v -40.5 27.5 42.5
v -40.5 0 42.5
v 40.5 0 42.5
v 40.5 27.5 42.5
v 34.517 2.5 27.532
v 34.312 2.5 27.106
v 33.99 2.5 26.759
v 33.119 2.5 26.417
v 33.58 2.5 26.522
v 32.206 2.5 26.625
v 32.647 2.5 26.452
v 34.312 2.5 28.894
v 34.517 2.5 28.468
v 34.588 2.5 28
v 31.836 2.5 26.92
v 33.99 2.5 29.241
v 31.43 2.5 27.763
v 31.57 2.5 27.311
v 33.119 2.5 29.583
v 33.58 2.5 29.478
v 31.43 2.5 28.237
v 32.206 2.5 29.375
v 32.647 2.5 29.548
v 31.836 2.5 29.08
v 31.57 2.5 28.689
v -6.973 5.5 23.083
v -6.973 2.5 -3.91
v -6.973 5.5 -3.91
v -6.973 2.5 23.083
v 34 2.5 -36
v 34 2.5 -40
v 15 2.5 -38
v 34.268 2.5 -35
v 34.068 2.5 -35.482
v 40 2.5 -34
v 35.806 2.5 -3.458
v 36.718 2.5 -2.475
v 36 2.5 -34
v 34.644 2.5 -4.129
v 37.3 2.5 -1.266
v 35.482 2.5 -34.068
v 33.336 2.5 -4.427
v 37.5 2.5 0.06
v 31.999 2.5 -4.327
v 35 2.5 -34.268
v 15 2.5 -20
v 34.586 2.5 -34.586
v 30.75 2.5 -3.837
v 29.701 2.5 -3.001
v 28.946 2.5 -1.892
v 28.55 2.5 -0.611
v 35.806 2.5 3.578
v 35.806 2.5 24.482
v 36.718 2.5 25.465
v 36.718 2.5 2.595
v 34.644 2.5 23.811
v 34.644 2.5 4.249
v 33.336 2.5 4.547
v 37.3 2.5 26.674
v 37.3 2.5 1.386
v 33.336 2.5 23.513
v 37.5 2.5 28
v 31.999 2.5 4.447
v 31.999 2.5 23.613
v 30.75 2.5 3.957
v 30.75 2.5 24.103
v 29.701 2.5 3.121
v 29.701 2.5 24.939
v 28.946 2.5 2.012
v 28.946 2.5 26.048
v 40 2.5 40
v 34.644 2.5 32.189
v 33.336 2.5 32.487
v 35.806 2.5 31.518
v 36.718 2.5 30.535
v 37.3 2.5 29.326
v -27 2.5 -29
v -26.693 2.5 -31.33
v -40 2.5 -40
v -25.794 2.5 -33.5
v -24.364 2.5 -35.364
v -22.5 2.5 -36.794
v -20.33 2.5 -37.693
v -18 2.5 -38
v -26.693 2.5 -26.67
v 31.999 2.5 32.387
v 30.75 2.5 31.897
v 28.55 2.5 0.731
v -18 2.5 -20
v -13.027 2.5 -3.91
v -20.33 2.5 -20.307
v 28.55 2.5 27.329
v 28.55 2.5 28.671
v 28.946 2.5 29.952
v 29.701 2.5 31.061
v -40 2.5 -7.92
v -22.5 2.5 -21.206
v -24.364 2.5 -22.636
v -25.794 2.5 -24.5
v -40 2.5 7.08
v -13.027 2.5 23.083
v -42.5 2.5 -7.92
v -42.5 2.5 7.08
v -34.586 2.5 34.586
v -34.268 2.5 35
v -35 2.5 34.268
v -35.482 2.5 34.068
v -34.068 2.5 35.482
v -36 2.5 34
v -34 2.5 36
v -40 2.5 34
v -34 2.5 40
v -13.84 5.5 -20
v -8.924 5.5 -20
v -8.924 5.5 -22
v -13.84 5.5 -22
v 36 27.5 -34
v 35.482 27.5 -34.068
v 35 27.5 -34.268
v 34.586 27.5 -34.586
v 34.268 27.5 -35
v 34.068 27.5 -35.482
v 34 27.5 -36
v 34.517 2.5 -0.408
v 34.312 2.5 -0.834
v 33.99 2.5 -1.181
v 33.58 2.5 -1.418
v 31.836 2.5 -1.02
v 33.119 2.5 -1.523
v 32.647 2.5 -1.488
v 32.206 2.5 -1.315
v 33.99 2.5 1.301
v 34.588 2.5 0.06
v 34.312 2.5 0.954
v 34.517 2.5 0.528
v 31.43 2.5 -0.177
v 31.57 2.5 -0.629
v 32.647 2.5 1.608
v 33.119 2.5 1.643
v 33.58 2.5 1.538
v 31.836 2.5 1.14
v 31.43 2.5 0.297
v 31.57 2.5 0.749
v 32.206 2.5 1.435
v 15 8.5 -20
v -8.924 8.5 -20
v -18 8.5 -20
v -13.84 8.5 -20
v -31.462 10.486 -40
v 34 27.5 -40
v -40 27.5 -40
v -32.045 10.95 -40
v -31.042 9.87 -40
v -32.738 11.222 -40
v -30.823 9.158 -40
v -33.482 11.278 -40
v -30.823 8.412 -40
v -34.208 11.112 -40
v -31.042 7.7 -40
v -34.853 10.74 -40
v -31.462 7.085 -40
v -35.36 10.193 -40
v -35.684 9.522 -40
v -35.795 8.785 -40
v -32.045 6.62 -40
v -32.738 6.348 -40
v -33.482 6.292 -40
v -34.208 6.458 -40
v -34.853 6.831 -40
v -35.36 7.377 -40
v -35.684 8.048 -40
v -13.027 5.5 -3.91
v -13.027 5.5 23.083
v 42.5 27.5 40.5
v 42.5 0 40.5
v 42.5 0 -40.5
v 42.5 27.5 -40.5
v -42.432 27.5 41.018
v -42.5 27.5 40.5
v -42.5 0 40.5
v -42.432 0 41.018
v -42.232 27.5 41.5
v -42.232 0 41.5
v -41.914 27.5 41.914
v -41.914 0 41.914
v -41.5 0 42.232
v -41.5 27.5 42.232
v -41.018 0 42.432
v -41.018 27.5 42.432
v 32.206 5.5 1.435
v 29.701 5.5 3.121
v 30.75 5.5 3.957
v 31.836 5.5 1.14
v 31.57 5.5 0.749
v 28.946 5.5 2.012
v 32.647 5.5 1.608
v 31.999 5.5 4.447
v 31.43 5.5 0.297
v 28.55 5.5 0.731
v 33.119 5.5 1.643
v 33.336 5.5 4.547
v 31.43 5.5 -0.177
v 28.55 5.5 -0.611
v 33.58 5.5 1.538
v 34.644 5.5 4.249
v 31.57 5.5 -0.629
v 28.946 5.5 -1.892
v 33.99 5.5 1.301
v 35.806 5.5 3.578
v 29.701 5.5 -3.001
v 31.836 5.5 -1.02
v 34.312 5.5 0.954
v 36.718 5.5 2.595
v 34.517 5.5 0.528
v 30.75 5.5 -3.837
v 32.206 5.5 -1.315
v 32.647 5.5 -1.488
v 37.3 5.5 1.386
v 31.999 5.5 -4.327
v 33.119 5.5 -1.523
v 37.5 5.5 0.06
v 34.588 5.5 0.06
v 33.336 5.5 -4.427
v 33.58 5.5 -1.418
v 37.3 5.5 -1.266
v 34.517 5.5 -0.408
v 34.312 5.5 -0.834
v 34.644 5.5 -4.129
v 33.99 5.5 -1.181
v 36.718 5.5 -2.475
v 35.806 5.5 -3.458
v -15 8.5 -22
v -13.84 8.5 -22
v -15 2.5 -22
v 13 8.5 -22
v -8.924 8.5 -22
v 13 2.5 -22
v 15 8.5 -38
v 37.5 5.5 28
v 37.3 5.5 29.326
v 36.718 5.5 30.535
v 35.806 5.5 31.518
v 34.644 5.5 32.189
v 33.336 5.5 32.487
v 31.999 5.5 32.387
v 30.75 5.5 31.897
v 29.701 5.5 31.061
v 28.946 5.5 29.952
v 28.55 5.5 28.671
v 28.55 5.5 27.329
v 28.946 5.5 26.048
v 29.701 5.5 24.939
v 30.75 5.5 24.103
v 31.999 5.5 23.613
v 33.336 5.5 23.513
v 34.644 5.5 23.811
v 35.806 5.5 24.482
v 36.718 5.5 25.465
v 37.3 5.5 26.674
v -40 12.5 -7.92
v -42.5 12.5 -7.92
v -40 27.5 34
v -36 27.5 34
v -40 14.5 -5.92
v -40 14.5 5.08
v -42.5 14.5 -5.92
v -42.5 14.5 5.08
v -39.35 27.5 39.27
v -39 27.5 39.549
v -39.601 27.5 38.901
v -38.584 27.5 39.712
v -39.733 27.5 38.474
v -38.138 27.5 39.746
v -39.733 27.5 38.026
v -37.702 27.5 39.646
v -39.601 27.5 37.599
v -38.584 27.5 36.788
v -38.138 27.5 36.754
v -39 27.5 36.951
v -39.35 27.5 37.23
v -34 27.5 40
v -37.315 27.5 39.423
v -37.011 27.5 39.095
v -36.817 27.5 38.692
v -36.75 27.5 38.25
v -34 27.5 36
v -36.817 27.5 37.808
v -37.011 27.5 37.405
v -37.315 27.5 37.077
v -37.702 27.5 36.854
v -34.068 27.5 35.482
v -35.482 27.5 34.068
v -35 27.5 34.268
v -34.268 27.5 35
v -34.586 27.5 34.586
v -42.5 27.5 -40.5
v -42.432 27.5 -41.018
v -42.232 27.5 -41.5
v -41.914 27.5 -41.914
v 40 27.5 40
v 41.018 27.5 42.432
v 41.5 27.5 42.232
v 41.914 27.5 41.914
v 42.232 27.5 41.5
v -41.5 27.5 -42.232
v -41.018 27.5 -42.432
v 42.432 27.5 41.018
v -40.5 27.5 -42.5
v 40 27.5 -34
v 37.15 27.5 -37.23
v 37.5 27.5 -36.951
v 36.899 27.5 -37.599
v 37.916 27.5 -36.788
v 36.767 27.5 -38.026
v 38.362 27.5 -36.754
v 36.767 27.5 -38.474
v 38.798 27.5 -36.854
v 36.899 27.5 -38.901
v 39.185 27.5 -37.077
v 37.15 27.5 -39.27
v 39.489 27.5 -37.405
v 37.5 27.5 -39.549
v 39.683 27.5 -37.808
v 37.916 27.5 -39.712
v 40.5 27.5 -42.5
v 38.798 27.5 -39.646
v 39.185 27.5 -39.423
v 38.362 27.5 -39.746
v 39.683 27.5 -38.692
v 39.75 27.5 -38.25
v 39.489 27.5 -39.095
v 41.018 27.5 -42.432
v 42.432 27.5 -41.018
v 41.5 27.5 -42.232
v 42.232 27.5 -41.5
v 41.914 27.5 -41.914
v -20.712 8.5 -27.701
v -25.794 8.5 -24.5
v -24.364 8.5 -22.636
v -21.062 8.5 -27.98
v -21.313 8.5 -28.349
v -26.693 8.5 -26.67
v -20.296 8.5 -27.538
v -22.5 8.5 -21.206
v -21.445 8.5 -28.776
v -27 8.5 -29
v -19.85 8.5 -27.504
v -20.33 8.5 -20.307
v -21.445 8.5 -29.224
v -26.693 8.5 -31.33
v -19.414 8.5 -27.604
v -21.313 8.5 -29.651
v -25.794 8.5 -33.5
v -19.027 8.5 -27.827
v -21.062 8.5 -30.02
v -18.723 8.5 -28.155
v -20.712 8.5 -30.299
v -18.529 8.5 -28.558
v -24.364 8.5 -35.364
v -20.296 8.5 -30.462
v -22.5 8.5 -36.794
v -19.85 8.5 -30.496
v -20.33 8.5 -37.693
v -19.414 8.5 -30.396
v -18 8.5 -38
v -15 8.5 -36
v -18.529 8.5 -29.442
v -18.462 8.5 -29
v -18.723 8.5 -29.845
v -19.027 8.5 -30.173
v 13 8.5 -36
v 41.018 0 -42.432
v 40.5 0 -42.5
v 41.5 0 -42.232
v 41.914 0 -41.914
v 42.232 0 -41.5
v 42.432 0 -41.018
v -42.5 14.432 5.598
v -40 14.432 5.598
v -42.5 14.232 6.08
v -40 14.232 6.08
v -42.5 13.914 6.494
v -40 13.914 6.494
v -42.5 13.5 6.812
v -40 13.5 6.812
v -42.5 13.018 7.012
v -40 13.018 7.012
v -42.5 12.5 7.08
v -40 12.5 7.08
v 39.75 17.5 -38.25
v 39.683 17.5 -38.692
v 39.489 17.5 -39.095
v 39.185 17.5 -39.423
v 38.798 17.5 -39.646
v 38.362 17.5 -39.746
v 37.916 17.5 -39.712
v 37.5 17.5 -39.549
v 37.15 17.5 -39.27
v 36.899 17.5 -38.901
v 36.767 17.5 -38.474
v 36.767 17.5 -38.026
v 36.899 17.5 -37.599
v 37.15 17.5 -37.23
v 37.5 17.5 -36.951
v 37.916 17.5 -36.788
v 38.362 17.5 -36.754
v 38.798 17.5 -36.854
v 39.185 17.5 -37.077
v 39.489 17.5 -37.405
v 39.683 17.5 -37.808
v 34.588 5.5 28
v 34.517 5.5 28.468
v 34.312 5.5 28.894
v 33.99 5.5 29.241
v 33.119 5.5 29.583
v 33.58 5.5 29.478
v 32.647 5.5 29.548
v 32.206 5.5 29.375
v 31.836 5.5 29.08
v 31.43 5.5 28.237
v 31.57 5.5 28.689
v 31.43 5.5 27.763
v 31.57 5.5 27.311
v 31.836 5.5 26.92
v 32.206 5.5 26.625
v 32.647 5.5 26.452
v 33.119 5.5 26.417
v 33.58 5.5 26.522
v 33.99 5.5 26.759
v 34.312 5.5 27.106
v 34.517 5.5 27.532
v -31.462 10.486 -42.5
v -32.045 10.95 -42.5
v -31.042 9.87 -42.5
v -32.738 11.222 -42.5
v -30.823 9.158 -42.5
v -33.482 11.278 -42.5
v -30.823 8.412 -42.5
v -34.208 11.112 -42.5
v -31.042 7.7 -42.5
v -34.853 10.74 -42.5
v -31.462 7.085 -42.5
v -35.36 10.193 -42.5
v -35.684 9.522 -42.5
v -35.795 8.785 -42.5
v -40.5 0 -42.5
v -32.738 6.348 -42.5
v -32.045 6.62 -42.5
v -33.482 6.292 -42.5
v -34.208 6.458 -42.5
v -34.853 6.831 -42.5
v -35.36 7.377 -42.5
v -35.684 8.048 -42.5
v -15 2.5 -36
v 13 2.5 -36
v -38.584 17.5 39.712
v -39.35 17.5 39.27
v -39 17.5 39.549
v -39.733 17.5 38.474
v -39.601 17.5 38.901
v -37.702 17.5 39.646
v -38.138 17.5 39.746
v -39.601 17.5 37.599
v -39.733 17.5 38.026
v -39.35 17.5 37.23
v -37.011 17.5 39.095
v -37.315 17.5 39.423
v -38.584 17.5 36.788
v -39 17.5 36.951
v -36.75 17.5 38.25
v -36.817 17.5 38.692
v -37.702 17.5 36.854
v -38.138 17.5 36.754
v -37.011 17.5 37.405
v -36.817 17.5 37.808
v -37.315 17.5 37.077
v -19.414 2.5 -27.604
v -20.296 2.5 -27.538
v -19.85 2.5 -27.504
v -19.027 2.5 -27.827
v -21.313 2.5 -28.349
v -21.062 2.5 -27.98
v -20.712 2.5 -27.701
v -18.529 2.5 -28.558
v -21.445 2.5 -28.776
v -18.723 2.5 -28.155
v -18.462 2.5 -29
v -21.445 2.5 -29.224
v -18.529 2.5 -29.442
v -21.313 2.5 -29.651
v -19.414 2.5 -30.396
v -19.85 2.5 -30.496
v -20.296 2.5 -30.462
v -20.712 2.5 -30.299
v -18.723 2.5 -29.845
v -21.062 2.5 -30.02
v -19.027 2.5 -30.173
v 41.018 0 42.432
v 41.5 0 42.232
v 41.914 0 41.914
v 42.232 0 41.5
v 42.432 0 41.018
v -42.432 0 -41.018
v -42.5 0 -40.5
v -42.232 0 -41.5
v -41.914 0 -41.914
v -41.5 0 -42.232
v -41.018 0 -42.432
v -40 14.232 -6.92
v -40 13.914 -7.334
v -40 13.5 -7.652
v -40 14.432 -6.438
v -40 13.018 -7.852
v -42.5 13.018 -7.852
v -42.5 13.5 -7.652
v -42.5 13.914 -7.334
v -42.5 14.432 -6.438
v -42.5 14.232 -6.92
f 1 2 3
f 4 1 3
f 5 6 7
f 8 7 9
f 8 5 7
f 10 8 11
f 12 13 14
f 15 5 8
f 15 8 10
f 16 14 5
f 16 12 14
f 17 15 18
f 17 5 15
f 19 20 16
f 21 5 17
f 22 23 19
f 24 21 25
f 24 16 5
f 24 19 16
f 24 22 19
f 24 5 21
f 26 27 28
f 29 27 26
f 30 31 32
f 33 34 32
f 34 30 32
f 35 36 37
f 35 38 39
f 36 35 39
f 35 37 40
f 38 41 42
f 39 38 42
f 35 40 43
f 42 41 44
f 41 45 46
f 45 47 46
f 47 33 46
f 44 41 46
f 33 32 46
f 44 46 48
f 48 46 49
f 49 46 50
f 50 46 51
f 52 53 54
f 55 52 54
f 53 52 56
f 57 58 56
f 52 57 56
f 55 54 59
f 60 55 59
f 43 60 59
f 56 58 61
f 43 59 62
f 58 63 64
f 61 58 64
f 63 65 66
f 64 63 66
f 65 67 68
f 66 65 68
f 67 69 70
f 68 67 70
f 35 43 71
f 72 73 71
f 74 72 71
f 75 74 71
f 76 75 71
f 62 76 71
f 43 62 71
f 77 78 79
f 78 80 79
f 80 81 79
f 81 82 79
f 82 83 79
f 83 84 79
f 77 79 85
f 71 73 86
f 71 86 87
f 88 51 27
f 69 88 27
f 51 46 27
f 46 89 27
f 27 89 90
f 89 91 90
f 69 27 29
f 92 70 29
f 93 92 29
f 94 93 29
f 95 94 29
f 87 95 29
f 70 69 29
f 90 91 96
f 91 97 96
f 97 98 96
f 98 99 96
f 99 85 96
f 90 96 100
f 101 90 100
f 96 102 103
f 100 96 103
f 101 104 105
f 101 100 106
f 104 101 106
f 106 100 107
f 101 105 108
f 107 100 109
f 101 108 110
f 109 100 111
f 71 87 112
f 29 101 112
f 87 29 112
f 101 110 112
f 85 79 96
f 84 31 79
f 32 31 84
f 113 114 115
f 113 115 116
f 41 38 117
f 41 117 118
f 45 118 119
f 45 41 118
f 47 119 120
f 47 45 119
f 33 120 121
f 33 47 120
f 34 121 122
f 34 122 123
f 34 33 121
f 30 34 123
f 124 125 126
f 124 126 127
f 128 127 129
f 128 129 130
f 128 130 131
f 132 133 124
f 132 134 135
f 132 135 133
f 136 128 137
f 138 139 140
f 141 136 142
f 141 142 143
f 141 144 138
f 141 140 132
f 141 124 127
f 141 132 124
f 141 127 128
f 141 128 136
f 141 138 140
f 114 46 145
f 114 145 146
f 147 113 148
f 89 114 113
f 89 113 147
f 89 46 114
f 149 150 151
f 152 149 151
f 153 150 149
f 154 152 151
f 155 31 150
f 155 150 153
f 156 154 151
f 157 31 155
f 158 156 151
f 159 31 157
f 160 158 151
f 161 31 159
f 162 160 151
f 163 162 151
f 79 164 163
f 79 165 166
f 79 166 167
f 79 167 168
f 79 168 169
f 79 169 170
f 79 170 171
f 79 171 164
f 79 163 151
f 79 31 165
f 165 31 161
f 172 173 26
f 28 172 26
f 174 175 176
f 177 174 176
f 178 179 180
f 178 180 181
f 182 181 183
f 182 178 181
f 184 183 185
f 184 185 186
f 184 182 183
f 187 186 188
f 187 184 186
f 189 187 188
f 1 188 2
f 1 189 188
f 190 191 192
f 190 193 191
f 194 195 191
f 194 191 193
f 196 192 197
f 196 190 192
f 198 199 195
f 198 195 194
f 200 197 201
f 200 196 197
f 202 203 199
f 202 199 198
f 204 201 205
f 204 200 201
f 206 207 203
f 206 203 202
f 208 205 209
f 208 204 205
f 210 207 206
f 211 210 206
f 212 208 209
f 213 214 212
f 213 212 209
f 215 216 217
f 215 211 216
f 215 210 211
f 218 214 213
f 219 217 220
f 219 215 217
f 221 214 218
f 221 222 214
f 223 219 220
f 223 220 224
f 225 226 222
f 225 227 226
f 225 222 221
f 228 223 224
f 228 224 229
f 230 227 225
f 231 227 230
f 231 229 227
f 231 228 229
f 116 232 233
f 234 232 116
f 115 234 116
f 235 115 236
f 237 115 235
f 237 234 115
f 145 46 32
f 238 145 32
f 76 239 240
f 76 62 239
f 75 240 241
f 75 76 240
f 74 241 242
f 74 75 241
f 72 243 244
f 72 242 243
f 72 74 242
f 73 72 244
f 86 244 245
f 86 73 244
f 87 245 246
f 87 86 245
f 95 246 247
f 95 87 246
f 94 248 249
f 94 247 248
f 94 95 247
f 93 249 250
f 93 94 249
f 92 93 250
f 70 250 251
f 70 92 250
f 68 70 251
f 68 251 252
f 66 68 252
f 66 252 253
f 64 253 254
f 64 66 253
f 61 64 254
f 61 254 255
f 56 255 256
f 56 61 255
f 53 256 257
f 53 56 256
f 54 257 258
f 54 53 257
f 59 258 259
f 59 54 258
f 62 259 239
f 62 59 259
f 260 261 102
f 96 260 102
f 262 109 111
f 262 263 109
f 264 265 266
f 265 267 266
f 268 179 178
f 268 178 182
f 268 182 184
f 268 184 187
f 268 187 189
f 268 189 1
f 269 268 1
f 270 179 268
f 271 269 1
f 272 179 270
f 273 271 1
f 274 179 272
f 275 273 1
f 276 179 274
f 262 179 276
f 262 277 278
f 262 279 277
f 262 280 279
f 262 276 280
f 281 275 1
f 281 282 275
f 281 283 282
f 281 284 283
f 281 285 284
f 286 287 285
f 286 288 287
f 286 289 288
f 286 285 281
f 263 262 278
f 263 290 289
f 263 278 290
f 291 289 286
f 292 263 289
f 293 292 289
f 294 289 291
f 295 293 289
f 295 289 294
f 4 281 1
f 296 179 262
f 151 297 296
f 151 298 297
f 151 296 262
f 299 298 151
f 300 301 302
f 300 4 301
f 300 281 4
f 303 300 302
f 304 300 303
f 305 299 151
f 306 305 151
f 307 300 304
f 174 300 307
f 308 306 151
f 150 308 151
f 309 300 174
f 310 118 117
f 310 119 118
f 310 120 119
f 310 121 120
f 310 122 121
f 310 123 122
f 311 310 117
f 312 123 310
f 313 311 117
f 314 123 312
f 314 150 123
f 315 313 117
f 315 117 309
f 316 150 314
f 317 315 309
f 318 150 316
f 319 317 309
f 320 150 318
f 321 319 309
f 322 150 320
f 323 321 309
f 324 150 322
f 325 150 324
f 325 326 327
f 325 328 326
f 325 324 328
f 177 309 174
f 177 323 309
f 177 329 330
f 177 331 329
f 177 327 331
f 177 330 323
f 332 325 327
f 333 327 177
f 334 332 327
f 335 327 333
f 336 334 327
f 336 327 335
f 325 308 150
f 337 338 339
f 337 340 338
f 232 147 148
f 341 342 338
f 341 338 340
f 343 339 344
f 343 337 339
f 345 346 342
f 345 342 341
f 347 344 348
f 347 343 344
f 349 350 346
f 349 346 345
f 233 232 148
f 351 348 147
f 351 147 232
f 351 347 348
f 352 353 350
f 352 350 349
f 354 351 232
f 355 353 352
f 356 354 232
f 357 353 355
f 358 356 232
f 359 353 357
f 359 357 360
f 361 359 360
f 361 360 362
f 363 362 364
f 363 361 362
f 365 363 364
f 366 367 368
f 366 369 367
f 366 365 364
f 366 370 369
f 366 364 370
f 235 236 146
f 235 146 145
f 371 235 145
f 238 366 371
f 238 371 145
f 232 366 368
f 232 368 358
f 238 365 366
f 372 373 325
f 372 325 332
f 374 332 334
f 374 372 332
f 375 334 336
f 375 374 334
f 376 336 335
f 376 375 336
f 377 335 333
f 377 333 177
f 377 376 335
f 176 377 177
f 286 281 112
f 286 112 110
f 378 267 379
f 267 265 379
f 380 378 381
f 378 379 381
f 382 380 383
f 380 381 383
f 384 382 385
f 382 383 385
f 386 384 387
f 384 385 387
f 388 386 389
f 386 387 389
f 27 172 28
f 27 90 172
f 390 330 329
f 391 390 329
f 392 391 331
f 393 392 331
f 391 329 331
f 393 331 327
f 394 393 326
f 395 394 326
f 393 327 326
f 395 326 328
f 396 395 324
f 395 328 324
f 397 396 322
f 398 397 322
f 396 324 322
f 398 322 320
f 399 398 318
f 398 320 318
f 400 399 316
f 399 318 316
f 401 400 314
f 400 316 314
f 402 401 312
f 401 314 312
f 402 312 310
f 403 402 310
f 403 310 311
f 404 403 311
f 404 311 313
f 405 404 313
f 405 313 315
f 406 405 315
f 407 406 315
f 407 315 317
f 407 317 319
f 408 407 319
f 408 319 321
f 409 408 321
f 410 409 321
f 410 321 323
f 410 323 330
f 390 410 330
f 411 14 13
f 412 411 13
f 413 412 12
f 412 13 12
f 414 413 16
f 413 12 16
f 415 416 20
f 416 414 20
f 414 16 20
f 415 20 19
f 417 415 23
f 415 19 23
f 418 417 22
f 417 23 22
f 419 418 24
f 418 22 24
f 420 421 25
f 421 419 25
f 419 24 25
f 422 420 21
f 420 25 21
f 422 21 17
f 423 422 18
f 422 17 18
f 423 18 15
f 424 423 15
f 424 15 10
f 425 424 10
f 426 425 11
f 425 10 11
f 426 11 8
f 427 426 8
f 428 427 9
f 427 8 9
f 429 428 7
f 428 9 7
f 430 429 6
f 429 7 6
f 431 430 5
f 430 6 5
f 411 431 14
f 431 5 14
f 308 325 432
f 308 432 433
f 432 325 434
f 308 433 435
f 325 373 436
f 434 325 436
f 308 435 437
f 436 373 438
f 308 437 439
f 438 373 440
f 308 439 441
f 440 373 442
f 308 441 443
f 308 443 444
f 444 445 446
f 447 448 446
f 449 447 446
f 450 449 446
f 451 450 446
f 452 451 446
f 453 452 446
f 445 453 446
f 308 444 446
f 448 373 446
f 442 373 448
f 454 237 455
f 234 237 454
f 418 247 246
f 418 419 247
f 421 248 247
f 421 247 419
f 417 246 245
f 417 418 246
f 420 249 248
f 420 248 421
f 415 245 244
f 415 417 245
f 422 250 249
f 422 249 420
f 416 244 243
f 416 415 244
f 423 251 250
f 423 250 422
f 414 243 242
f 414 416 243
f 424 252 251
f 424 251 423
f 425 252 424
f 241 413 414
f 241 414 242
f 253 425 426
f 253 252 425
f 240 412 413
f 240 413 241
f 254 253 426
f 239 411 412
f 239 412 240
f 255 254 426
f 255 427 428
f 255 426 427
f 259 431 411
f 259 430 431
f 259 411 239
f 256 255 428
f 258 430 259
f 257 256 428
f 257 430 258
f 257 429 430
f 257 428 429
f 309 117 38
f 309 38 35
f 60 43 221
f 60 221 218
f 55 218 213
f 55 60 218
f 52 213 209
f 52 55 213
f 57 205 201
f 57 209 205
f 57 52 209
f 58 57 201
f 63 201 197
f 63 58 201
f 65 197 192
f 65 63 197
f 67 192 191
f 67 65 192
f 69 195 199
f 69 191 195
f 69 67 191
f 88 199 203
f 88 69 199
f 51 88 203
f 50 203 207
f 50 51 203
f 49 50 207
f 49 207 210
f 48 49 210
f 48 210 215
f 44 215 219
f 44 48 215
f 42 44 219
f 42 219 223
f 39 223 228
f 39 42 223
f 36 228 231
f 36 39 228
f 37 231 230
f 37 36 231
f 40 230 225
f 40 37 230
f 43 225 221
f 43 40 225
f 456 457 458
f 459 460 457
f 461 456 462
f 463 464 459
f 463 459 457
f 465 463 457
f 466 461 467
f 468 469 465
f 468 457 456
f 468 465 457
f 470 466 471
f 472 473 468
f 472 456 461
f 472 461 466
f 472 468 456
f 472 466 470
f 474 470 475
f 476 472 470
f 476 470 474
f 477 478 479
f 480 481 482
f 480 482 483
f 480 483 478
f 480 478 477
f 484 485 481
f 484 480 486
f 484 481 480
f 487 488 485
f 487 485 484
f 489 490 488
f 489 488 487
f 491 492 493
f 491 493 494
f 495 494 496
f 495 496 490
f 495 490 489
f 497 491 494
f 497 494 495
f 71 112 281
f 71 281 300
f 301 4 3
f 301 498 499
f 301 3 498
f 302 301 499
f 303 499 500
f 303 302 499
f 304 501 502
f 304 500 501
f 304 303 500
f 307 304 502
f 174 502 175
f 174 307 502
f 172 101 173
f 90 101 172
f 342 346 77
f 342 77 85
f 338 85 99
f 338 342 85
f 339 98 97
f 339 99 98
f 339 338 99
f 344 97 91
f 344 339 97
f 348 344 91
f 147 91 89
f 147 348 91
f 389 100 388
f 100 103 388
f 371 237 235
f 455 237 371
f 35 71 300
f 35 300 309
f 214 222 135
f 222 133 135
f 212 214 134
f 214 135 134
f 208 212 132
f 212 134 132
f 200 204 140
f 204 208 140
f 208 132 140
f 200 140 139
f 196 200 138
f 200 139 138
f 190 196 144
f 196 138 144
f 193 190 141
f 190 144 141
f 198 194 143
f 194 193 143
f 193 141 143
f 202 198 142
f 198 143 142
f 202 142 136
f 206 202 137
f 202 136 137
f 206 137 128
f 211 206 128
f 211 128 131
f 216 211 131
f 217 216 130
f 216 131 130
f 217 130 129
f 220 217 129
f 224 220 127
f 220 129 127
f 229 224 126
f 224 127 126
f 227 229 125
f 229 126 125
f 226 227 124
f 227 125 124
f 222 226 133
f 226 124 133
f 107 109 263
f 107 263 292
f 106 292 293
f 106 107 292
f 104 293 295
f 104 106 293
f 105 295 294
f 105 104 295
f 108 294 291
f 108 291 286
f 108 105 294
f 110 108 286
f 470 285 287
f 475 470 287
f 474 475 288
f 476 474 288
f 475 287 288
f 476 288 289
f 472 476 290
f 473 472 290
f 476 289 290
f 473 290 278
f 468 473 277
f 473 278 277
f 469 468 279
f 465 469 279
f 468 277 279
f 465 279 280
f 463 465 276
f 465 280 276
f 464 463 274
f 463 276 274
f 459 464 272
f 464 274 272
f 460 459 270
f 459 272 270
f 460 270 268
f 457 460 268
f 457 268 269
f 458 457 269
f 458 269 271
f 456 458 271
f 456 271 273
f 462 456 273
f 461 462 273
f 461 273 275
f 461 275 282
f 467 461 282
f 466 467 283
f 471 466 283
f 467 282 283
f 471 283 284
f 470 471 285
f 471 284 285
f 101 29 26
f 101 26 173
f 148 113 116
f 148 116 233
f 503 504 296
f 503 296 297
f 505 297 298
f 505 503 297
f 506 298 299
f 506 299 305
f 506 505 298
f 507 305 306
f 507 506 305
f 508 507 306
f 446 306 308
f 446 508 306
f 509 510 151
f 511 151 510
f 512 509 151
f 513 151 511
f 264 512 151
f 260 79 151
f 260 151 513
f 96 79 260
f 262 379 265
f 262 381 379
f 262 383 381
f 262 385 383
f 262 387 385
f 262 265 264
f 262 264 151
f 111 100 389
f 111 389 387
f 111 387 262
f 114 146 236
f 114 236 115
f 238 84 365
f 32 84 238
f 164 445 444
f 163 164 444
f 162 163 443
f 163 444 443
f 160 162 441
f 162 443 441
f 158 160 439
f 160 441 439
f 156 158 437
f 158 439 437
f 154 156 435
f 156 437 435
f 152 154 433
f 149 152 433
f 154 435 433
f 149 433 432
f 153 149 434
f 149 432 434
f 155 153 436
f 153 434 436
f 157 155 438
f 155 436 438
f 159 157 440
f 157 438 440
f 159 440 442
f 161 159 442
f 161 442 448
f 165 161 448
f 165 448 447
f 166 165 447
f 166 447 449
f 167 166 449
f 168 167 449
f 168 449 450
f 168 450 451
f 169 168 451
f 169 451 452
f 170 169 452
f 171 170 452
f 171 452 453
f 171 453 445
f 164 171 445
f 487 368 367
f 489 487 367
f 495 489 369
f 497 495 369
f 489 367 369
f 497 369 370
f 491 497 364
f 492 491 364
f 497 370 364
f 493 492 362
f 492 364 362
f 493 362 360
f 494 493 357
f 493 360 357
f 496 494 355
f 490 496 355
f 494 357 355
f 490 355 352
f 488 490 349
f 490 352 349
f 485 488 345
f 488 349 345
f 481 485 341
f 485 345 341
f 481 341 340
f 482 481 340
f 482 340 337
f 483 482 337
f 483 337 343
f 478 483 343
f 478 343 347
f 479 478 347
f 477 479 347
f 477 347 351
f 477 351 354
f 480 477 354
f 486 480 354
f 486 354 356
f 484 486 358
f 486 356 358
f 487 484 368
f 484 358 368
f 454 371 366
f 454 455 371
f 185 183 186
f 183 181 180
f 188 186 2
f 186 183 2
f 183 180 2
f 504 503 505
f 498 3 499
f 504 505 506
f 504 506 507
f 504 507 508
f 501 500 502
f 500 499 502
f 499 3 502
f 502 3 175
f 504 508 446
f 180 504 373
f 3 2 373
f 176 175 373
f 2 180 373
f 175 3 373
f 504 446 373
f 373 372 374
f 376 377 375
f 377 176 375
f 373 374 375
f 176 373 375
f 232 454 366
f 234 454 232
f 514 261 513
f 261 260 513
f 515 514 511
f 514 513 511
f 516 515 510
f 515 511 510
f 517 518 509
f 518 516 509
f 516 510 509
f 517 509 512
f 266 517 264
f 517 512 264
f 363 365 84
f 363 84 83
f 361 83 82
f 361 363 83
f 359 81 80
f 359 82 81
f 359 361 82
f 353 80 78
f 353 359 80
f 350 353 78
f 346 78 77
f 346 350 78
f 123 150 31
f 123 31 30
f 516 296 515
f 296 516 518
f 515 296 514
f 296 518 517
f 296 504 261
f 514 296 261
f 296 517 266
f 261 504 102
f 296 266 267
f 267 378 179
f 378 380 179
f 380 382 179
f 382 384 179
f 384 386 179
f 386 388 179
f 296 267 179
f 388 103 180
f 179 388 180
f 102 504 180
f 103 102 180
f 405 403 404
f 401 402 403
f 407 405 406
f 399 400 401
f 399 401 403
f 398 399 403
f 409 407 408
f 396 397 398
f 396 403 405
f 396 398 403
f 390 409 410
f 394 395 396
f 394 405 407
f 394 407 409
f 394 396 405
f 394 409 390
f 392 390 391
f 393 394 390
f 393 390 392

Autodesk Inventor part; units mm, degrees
ref_plane "YZ Plane" through (0, 0, 0) normal (1, 0, 0) x (0, 1, 0)
ref_plane "XZ Plane" through (0, 0, 0) normal (0, 1, 0) x (-1, 0, 0)
ref_plane "XY Plane" through (0, 0, 0) normal (0, 0, 1) x (1, 0, 0)
sketch "Esboço1" plane through (0, 0, 0) normal (0, 1, 0) x (-1, 0, 0)
  line L0 (-40, 40) -> (40, 40)
  line L1 (40, 40) -> (40, -40)
  line L2 (40, -40) -> (-40, -40)
  line L3 (-40, -40) -> (-40, 40)
  line L4 (-40, 40) -> (40, -40) construction
  line L5 (40, 40) -> (-40, -40) construction
  point P0 (0, 0)
  dimension "d0" = 80
  dimension "d1" = 80
extrude "Extrusão1" add sketch "Esboço1" along normal blind 2.5
sketch "Esboço2" plane through (0, 2.5, 0) normal (0, 1, 0) x (1, 0, 0)
  circle A0 centre (33, -28) radius 1.5875
  line L0 (-40, -40) -> (40, -40) projected
  line L1 (40, -40) -> (40, 40) projected
  circle A1 centre (33, -0.06) radius 1.5875
  circle A2 centre (33, -28) radius 4.5
  circle A3 centre (33, -0.06) radius 4.5
  dimension "d4" = 3.175
  dimension "d5" = 12
  dimension "d6" = 7
  dimension "d7" = 3.175
  dimension "d8" = 27.94
  dimension "d9" = 9
  dimension "d10" = 9
extrude "Extrusão2" add sketch "Esboço2" along normal blind 3
sketch "Esboço3" plane through (0, 2.5, 0) normal (0, 1, 0) x (1, 0, 0)
  line L0 (-6.9727, -23.0834) -> (-13.0273, -23.0834)
  line L1 (-13.0273, -23.0834) -> (-13.0273, 3.9103)
  line L2 (-13.0273, 3.9103) -> (-6.9727, 3.9103)
  line L3 (-6.9727, 3.9103) -> (-6.9727, -23.0834)
  line L4 (-6.9727, -23.0834) -> (-13.0273, 3.9103) construction
  line L5 (-13.0273, -23.0834) -> (-6.9727, 3.9103) construction
  line L6 (40, -40) -> (40, 40) projected
  point P0 (0, 0)
  point P1 (-10, -9.5866)
  dimension "d13" = 50
extrude "Extrusão3" add sketch "Esboço3" along normal blind 3
sketch "Esboço4" plane through (0, 2.5, 0) normal (0, 1, 0) x (1, 0, 0)
  line L0 (13, 36) -> (-15, 36)
  line L1 (-15, 36) -> (-15, 22)
  line L2 (-15, 22) -> (13, 22)
  line L3 (13, 22) -> (13, 36)
  line L4 (35.54, 17.72) -> (-33.04, 17.72)
  line L5 (-33.04, 17.72) -> (-33.04, -35.62)
  line L6 (-33.04, -35.62) -> (35.54, -35.62)
  line L7 (35.54, -35.62) -> (35.54, 17.72)
  circle A0 centre (33, -28) radius 1.5875 projected
  line L8 (15, 38) -> (-17, 38)
  line L9 (-17, 38) -> (-17, 20)
  line L10 (-17, 20) -> (15, 20)
  line L11 (15, 20) -> (15, 38)
  line L12 (40, 40) -> (-40, 40) projected
  line L13 (40, -40) -> (40, 40) projected
  point P0 (0, 0)
  dimension "d16" = 28
  dimension "d17" = 14
  dimension "d18" = 68.58
  dimension "d19" = 53.34
  dimension "d20" = 7.62
  dimension "d21" = 2.54
  dimension "d22" = 4
  dimension "d23" = 27
  dimension "d24" = 2
  dimension "d25" = 2
  dimension "d26" = 2
  dimension "d27" = 2
extrude "Extrusão4" add sketch "Esboço4" along normal blind 6 contours L11 L10 L9 L8
sketch "Esboço5" plane through (-17, 2.5, -20) normal (0, 0, 1) x (1, 0, 0)
  line L0 (0, 6) -> (32, 6) projected
  line L1 (3.1604, 6) -> (8.0765, 6)
  line L2 (8.0765, 6) -> (8.0765, 3)
  line L3 (8.0765, 3) -> (3.1604, 3)
  line L4 (3.1604, 3) -> (3.1604, 6)
  point P0 (17, -2.5)
  dimension "d32" = 3
extrude "Extrusão5" cut sketch "Esboço5" against normal blind 6
sketch "Esboço6" plane through (0, 2.5, 0) normal (0, 1, 0) x (1, 0, 0)
  line L0 (15, 20) -> (-17, 20) projected
  line L1 (-17, 20) -> (-27, 20)
  line L2 (-27, 20) -> (-27, 38)
  line L3 (-27, 38) -> (-17, 38)
  line L4 (-17, 38) -> (-17, 20)
  point P0 (0, 0)
  dimension "d33" = 10
extrude "Extrusão6" add sketch "Esboço6" along normal blind 6
fillet "Arredondamento1" radius 9 2 edges at (-27, 5.5, -20) (-27, 5.5, -38)
sketch "Esboço7" plane through (0, 8.5, 0) normal (0, 1, 0) x (1, 0, 0)
  circle A0 centre (-19.962, 29) radius 1.5
  point P0 (0, 0)
  dimension "d37" = 3
extrude "Extrusão7" cut sketch "Esboço7" against normal blind 6
sketch "Esboço8" plane through (0, 2.5, 0) normal (0, 1, 0) x (1, 0, 0)
  line L0 (-42.5, -42.5) -> (42.5, -42.5)
  line L1 (42.5, -42.5) -> (42.5, 42.5)
  line L2 (42.5, 42.5) -> (-42.5, 42.5)
  line L3 (-42.5, 42.5) -> (-42.5, -42.5)
  line L4 (40, 40) -> (-40, 40) projected
  line L5 (-40, 40) -> (-40, -40) projected
  line L6 (-40, -40) -> (40, -40) projected
  line L7 (40, -40) -> (40, 40) projected
  point P0 (0, 0)
  dimension "d40" = 2.5
  dimension "d41" = 2.5
  dimension "d42" = 2.5
  dimension "d43" = 2.5
extrude "Extrusão8" add sketch "Esboço8" along normal blind 25 and the other way blind 2.5
fillet "Arredondamento2" radius 2 4 edges at (-42.5, 13.75, 42.5) (-42.5, 13.75, -42.5) (42.5, 13.75, 42.5) (42.5, 13.75, -42.5)
sketch "Esboço10" plane through (-42.5, 0, -40.5) normal (-1, 0, 0) x (0, 0, 1)
  line L0 (76.52, 0) -> (23.18, 0)
  line L1 (81, 27.5) -> (81, 0) projected
  line L2 (0.5, 2.5) -> (80.5, 2.5) projected
  line L3 (32.58, 2.5) -> (47.58, 2.5)
  line L4 (47.58, 2.5) -> (47.58, 14.5)
  line L5 (47.58, 14.5) -> (32.58, 14.5)
  line L6 (32.58, 14.5) -> (32.58, 2.5)
  point P0 (40.5, 0)
  dimension "d51" = 15
  dimension "d52" = 12
extrude "Extrusão9" cut sketch "Esboço10" against normal blind 3
fillet "Arredondamento3" radius 2 2 edges at (-41.25, 14.5, 7.08) (-41.25, 14.5, -7.92)
sketch "Esboço11" plane through (0, 27.5, 0) normal (0, 1, 0) x (1, 0, 0)
  line L0 (40, -40) -> (40, 40) projected
  line L1 (40, 40) -> (34, 40)
  line L2 (34, 40) -> (34, 34)
  line L3 (34, 34) -> (40, 34)
  line L4 (40, 34) -> (40, 40)
  line L5 (-40, -7.08) -> (-40, -40) projected
  line L6 (-40, -40) -> (-34, -40)
  line L7 (-34, -40) -> (-34, -34)
  line L8 (-34, -34) -> (-40, -34)
  line L9 (-40, -34) -> (-40, -40)
  point P0 (0, 0)
  dimension "d57" = 6
  dimension "d58" = 6
  dimension "d59" = 6
  dimension "d60" = 6
extrude "Extrusão10" add sketch "Esboço11" against normal blind 25
fillet "Arredondamento4" radius 2 2 edges at (-34, 15, 34) (34, 15, -34)
sketch "Esboço12" plane through (0, 27.5, 0) normal (0, 1, 0) x (1, 0, 0)
  circle A0 centre (-38.25, -38.25) radius 1.5
  circle A1 centre (38.25, 38.25) radius 1.5
  line L0 (40.5, 42.5) -> (-40.5, 42.5) projected
  line L1 (42.5, -40.5) -> (42.5, 40.5) projected
  line L2 (-40.5, -42.5) -> (40.5, -42.5) projected
  line L3 (-42.5, 40.5) -> (-42.5, -40.5) projected
  point P0 (0, 0)
  dimension "d64" = 3
  dimension "d65" = 3
  dimension "d66" = 4.25
  dimension "d67" = 4.25
  dimension "d68" = 4.25
  dimension "d69" = 4.25
extrude "Extrusão11" cut sketch "Esboço12" against normal blind 10
sketch "Esboço13" plane through (40.5, 0, -42.5) normal (0, 0, -1) x (-1, 0, 0)
  circle A0 centre (73.7947, 8.7851) radius 2.5
  point P0 (40.5, 0)
  dimension "d72" = 5
extrude "Extrusão12" cut sketch "Esboço13" against normal blind 10
properties part number "caixa box"
